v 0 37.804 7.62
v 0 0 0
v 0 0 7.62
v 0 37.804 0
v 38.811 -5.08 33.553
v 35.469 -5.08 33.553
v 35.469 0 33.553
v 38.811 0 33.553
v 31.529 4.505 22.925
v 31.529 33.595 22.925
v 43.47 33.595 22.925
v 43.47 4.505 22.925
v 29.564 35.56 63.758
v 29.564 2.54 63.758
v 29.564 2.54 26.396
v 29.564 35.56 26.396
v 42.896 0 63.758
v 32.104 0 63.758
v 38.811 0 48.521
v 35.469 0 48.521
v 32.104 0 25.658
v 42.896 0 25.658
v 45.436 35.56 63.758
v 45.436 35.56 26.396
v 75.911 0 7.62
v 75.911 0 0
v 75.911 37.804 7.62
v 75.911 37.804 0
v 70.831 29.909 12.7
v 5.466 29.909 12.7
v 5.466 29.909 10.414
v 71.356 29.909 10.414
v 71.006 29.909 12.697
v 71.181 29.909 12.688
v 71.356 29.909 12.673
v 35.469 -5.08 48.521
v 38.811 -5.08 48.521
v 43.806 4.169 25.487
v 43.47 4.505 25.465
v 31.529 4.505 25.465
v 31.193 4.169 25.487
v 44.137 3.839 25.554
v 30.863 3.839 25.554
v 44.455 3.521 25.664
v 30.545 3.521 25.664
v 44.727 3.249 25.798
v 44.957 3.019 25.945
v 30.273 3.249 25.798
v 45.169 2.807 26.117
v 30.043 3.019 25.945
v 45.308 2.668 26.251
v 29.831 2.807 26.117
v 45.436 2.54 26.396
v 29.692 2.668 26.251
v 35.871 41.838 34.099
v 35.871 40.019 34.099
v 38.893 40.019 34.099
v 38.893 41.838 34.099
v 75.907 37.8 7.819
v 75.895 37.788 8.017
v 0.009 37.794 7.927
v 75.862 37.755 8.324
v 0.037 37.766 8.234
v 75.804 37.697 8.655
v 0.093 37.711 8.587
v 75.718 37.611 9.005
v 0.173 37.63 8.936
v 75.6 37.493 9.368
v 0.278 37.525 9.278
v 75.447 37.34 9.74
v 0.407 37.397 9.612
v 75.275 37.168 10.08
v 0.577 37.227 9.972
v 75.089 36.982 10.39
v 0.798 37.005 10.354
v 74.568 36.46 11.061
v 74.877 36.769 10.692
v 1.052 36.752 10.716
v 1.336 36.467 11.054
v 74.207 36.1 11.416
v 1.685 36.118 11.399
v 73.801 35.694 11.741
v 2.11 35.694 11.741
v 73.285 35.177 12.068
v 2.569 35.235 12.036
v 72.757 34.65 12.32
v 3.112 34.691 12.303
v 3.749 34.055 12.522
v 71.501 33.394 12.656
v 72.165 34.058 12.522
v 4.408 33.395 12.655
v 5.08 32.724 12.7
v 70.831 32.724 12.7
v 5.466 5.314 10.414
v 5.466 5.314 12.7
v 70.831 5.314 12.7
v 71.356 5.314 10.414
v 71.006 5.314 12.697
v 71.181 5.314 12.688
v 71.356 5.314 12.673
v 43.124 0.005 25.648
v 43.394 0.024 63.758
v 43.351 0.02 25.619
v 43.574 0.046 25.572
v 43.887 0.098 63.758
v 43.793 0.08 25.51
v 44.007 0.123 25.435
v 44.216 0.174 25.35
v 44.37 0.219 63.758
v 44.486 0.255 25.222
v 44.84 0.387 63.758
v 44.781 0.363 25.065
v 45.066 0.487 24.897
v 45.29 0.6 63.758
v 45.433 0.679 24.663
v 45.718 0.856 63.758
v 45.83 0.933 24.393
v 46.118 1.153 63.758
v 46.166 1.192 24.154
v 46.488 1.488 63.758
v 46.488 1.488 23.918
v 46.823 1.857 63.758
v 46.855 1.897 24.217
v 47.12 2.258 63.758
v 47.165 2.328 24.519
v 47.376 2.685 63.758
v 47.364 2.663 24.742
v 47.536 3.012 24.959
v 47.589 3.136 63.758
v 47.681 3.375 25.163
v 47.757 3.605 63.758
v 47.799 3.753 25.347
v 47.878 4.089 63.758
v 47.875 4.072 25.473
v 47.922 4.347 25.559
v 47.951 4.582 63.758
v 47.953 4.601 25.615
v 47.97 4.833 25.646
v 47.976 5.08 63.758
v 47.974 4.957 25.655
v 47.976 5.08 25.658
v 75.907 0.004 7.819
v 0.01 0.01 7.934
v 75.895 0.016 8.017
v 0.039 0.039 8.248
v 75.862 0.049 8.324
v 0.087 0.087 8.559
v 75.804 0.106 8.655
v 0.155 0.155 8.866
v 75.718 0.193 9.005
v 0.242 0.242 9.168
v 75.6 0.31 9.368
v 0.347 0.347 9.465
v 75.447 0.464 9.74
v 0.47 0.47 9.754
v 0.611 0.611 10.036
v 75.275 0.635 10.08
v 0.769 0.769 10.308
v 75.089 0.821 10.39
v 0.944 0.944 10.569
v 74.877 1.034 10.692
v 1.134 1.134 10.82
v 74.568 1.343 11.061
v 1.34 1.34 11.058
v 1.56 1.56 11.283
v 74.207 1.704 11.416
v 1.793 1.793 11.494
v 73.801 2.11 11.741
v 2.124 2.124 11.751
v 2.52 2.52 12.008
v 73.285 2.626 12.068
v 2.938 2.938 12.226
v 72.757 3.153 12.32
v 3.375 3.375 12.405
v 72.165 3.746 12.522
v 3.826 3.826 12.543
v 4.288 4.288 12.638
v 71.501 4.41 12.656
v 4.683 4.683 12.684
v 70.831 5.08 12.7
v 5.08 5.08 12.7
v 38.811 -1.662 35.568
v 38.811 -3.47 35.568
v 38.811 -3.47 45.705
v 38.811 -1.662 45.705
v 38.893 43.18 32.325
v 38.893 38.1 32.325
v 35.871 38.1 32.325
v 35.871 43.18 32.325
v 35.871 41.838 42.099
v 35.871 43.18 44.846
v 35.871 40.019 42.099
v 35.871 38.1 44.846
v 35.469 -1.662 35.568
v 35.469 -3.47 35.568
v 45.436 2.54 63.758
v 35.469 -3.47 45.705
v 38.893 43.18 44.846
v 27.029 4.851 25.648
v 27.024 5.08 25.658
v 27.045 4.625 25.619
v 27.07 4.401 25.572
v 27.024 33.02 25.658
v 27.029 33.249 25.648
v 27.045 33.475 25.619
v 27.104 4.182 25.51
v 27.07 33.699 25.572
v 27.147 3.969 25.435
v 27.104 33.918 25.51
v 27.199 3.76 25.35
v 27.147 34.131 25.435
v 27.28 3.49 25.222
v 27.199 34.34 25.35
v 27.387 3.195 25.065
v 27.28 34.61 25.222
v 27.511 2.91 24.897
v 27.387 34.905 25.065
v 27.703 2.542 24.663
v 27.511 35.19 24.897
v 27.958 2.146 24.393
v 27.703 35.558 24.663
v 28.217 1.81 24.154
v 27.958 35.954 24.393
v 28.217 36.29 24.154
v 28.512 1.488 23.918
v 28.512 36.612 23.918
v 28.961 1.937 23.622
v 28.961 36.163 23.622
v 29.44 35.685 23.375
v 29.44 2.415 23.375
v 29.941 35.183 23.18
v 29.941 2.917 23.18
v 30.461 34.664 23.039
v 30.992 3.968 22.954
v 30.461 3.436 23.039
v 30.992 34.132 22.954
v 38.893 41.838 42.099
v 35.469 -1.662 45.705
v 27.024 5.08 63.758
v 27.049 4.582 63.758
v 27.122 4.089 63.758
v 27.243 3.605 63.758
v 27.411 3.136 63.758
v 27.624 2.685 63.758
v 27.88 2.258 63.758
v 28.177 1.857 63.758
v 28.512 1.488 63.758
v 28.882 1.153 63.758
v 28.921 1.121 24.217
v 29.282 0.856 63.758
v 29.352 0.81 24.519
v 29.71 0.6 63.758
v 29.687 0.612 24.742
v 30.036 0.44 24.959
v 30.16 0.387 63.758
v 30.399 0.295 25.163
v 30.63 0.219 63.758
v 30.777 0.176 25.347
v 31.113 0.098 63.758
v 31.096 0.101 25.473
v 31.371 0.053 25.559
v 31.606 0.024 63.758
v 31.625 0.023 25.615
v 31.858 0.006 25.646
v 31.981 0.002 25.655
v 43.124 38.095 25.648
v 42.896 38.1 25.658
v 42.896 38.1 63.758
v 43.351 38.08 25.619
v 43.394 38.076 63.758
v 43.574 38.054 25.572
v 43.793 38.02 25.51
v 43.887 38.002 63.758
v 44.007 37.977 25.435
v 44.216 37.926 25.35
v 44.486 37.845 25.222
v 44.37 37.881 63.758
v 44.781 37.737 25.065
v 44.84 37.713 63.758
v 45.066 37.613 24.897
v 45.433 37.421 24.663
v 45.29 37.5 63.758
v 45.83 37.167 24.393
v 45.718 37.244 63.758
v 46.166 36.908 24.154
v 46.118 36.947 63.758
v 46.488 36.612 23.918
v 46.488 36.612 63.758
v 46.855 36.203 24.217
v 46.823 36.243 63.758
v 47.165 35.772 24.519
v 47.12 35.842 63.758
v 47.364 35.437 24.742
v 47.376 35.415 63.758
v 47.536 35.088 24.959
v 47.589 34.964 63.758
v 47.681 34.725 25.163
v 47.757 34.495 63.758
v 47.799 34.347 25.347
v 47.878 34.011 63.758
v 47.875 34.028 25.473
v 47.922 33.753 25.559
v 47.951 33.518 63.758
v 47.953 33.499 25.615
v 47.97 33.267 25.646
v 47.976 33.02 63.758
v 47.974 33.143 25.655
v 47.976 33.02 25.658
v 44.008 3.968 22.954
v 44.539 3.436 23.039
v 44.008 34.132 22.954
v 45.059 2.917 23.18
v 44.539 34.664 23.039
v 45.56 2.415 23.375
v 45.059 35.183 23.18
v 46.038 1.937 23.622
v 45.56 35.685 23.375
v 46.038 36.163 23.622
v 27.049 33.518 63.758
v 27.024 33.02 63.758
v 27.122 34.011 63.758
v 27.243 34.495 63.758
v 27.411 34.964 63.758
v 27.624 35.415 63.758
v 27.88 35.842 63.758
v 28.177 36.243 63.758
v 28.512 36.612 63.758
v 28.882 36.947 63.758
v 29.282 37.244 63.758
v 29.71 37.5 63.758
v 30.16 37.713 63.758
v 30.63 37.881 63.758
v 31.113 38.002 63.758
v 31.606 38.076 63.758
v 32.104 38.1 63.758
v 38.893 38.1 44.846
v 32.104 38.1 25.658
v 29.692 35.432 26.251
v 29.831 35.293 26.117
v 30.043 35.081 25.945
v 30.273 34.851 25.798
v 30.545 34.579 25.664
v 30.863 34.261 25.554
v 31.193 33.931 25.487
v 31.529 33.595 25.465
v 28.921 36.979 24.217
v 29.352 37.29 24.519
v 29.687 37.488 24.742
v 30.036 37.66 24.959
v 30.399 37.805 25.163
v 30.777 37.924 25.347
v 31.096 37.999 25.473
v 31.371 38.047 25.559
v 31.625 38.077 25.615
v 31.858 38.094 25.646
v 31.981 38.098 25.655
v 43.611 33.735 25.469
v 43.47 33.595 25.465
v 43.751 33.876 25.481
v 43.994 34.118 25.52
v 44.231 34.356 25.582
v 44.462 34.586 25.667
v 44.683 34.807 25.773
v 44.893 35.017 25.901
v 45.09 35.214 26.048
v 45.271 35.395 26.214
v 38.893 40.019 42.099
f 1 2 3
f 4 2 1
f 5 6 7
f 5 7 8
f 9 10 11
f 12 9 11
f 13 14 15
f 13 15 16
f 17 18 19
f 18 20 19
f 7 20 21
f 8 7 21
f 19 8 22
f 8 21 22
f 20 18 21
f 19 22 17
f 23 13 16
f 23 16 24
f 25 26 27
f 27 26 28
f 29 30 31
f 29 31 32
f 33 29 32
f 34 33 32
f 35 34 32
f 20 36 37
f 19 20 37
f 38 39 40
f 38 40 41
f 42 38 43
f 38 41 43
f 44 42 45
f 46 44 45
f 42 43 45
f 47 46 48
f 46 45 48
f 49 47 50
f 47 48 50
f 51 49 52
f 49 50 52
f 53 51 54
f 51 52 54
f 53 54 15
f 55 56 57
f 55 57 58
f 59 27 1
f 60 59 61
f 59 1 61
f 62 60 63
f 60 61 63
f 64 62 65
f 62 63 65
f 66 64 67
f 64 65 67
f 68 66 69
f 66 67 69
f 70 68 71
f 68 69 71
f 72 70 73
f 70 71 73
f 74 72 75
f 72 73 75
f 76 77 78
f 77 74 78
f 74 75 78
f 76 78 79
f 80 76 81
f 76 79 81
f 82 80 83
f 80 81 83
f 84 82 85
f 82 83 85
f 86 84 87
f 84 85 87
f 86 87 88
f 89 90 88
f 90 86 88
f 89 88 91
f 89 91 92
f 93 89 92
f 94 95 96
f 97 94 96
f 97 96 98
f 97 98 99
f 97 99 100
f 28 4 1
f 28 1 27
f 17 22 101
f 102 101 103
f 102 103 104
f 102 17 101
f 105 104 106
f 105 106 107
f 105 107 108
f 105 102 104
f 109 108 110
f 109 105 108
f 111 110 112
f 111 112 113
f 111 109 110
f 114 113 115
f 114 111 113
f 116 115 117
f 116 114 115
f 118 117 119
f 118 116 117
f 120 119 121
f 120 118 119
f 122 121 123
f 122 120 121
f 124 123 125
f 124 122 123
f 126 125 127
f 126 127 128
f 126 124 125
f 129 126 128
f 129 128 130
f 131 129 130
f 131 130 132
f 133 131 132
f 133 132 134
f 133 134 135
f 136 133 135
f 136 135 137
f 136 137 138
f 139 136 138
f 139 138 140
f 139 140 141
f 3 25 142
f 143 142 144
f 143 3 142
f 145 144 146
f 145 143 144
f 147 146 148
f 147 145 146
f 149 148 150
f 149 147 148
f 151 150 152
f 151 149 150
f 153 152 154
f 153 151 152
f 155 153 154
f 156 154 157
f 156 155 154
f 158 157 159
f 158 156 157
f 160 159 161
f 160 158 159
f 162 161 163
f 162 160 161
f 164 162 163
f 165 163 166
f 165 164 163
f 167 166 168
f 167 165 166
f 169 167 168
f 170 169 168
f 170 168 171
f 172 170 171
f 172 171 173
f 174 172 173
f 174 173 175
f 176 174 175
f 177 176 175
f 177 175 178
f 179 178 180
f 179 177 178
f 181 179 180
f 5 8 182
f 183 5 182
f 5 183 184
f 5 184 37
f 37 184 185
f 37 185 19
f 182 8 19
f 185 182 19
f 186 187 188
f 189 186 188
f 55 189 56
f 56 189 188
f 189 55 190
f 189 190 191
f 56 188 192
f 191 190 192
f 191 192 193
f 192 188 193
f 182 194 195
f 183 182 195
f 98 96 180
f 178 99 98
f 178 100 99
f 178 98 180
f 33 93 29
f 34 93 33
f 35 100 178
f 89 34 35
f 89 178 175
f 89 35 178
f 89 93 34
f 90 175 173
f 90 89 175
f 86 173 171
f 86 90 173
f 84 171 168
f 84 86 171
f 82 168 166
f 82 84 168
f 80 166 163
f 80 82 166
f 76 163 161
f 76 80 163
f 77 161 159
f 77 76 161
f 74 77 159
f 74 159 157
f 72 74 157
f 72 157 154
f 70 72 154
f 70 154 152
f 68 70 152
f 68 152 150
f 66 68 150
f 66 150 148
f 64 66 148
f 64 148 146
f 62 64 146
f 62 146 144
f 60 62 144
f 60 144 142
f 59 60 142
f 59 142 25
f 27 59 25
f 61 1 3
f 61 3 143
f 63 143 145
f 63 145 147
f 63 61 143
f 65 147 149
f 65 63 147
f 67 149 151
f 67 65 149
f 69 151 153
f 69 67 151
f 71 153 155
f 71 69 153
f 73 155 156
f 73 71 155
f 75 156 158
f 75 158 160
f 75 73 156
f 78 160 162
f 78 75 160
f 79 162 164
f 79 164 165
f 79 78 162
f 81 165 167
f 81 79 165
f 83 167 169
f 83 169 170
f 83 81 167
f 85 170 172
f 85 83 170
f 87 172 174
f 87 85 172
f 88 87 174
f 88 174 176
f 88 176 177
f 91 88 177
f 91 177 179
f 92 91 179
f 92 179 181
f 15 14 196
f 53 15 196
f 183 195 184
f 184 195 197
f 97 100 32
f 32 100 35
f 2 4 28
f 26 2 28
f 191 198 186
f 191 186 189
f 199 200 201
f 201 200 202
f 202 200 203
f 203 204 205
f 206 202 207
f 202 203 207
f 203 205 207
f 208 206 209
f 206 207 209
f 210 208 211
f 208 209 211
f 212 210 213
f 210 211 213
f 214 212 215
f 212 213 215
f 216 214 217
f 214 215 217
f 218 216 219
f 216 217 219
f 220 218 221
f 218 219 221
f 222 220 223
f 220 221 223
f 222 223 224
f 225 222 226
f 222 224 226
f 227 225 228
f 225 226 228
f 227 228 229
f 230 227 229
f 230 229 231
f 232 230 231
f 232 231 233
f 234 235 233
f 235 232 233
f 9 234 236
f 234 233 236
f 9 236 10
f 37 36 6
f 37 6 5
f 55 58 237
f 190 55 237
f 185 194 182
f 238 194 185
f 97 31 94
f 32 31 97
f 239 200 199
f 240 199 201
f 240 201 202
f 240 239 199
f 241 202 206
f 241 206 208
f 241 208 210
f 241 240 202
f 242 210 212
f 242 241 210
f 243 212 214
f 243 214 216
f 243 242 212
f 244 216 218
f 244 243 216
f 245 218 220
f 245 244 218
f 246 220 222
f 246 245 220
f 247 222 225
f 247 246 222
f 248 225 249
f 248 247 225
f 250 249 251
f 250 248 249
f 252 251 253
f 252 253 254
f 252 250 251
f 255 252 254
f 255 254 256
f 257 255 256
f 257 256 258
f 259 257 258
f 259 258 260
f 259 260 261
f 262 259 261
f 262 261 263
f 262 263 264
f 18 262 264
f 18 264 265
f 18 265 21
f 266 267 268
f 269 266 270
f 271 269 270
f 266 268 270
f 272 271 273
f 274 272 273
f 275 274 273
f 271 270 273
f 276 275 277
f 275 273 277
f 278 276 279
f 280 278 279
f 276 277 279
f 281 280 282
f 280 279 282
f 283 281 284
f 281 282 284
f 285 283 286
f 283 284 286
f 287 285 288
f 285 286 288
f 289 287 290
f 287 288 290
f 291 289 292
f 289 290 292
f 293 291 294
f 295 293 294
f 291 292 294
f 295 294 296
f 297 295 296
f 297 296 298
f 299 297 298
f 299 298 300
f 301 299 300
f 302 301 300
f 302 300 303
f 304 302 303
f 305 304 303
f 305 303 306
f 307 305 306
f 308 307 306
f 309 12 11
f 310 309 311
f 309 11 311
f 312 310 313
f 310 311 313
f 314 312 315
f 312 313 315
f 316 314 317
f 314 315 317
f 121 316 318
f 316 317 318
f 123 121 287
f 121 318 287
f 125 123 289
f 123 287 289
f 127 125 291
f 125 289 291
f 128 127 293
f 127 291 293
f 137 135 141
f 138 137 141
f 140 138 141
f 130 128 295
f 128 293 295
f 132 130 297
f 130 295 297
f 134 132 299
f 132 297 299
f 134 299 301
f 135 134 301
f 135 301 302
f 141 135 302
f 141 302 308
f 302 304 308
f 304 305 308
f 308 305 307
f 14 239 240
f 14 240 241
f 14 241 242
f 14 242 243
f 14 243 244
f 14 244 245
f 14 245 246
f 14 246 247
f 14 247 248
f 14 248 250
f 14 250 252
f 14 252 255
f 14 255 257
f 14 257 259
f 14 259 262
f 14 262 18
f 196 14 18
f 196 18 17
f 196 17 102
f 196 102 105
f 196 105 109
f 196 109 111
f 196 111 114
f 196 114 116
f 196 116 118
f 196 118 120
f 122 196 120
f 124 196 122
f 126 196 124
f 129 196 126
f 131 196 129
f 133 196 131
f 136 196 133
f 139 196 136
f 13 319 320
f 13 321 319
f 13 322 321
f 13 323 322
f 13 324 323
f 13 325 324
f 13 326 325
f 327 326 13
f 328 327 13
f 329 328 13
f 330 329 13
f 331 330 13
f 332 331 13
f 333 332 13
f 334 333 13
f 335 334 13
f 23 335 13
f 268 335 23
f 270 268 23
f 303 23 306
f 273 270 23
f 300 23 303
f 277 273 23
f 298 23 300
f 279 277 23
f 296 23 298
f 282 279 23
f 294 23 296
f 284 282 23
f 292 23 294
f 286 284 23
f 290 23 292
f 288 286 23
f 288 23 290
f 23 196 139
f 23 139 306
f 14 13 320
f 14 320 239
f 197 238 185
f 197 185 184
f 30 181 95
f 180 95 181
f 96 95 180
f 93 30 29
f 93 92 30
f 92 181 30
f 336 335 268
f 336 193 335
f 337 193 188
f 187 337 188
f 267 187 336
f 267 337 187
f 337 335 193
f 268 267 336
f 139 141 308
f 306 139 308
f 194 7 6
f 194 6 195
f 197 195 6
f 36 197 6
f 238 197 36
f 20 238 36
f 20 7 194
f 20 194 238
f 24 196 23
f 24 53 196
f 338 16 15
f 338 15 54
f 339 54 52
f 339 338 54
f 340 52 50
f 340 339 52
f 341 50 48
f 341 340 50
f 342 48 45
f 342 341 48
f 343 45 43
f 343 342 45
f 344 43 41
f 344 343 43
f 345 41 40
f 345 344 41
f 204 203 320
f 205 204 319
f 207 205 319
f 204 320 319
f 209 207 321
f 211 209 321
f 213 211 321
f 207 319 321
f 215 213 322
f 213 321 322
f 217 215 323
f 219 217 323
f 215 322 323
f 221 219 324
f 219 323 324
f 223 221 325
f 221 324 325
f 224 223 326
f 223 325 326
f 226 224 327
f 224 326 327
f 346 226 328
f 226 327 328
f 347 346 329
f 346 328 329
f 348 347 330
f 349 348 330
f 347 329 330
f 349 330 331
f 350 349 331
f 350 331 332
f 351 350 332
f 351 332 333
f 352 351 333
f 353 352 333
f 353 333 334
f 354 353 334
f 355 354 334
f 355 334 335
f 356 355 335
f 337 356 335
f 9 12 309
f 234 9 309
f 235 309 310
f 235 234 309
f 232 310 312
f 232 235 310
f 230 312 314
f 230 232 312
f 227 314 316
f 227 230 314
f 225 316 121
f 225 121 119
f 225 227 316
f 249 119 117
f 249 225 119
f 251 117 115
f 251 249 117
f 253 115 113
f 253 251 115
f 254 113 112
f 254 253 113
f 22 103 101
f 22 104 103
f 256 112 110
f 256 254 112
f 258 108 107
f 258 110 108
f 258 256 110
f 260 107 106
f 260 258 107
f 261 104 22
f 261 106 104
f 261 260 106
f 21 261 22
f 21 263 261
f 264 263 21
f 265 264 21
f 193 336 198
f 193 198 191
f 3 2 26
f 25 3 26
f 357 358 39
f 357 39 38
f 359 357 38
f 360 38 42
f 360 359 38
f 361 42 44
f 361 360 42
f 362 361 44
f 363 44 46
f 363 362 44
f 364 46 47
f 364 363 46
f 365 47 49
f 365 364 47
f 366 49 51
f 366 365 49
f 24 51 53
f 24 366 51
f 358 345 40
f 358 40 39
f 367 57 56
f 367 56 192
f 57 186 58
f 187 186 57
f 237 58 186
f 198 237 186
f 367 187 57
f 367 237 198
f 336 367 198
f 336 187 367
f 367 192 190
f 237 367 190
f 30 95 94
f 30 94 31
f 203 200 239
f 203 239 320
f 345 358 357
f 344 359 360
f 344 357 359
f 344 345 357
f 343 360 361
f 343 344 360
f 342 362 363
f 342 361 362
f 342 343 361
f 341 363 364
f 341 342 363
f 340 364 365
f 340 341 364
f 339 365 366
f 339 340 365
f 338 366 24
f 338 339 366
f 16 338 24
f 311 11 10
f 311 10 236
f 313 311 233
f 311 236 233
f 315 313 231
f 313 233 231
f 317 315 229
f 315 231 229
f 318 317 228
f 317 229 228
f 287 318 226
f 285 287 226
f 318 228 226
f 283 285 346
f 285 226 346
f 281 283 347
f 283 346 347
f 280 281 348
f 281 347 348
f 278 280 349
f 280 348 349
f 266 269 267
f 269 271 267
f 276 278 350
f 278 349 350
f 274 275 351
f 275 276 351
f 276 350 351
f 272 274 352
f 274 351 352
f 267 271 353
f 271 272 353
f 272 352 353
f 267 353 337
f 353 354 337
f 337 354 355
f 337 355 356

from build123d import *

# Parameters (mm, degrees)
F0_W         = 75.910821557
F0_H         = 37.8035865724
F1_DEPTH     = 12.7
F2_W         = 65.8906013705
F2_H         = 24.5951046236
F3_DEPTH     = 2.286
F7_T1_DEPTH  = 101.310821557
F7_T3_DEPTH  = 63.2035865724
F8_W         = 20.9513884038
F8_H         = 2.7327910066
F9_DEPTH     = 38.1
F10_T1_DEPTH = 43.477489898
F10_T3_DEPTH = 60.6261014942
F11_W        = 20.9513884038
F11_H        = 38.1
F12_DEPTH    = 38.1
F13_T        = -2.54
F14_R        = 5.08
F15_R        = 5.08
F16_W        = 3.3429935575
F16_H        = 14.9679705501
F17_DEPTH    = 5.08
F18_W        = 1.8081573071
F18_H        = 10.1374536753
F19_DEPTH    = 5.08
F20_W        = 3.0222646892
F20_H        = 12.5214233994
F21_DEPTH    = 5.08
F22_W        = 1.8191151321
F22_H        = 8.0005712807
F23_DEPTH    = 5.08


# Not quite as in the source:
# - a fillet or chamfer that OpenCascade refuses, or shapes differently, is made with other operations: its cross-section is extruded or revolved along the edge and cut away or added
# - the program builds the solid bodies; features that only make, move or delete a surface that nothing else refers to are left out


with BuildPart() as f1:
    # F0 (on Top) → F1 (new body)
    with BuildSketch(Plane.XY):
        with Locations((37.9554107785, 18.9017932862)):
            Rectangle(F0_W, F0_H)
    extrude(amount=F1_DEPTH)

    # F2 (on face) → F3 (cut)
    with BuildSketch(Plane.XY.offset(12.7)):
        with Locations((38.4108766448, 17.6113096531)):
            Rectangle(F2_W, F2_H)
    extrude(amount=-F3_DEPTH, mode=Mode.SUBTRACT)

    # F7: fillet of radius 5.08 on 4 edges, made by hand

    # F7_s2 → F7_t1 (cut)
    with BuildSketch(Plane.YZ.offset(-12.7)):
        with BuildLine():
            ThreePointArc((0, 7.62), (1.4878975516, 11.2121024484), (5.08, 12.7))
            Line((5.08, 12.7), (0, 12.7))
            Line((0, 12.7), (0, 7.62))
        make_face()
        with BuildLine():
            ThreePointArc((37.8035865724, 7.62), (36.3156890208, 11.2121024484), (32.7235865724, 12.7))
            Line((32.7235865724, 12.7), (37.8035865724, 12.7))
            Line((37.8035865724, 12.7), (37.8035865724, 7.62))
        make_face()
    extrude(amount=F7_T1_DEPTH, mode=Mode.SUBTRACT)

    # F7_s4 → F7_t3 (cut)
    with BuildSketch(Plane.XZ.offset(-50.5035865724)):
        with BuildLine():
            ThreePointArc((0, 7.62), (1.4878975516, 11.2121024484), (5.08, 12.7))
            Line((5.08, 12.7), (0, 12.7))
            Line((0, 12.7), (0, 7.62))
        make_face()
        with BuildLine():
            ThreePointArc((70.830821557, 12.7), (74.4229240055, 11.2121024484), (75.910821557, 7.62))
            Line((75.910821557, 7.62), (75.910821557, 12.7))
            Line((75.910821557, 12.7), (70.830821557, 12.7))
        make_face()
    extrude(amount=F7_T3_DEPTH, mode=Mode.SUBTRACT)


with BuildPart() as f9:
    # F8 (on Front) → F9 (new body)
    with BuildSketch(Plane.XZ):
        with Locations((37.4999428168, 24.2914613336)):
            Rectangle(F8_W, F8_H)
    extrude(amount=-F9_DEPTH)

    # F10: fillet of radius 5.08 on 4 edges, made by hand

    # F10_s2 → F10_t1 (cut)
    with BuildSketch(Plane.YZ.offset(15.7611978678)):
        with BuildLine():
            ThreePointArc((4.5052202988, 22.9250658303), (1.8705876572, 23.6616672943), (0, 25.6578568369))
            Line((0, 25.6578568369), (0, 22.9250658303))
            Line((0, 22.9250658303), (4.5052202988, 22.9250658303))
        make_face()
        with BuildLine():
            ThreePointArc((33.5947797012, 22.9250658303), (36.2294123428, 23.6616672943), (38.1, 25.6578568369))
            Line((38.1, 25.6578568369), (38.1, 22.9250658303))
            Line((38.1, 22.9250658303), (33.5947797012, 22.9250658303))
        make_face()
    extrude(amount=F10_T1_DEPTH, mode=Mode.SUBTRACT)

    # F10_s4 → F10_t3 (cut)
    with BuildSketch(Plane.XZ.offset(-49.3630507471)):
        with BuildLine():
            ThreePointArc((43.4704167198, 22.9250658303), (46.1050493615, 23.6616672943), (47.9756370187, 25.6578568369))
            Line((47.9756370187, 25.6578568369), (47.9756370187, 22.9250658303))
            Line((47.9756370187, 22.9250658303), (43.4704167198, 22.9250658303))
        make_face()
        with BuildLine():
            ThreePointArc((27.0242486149, 25.6578568369), (28.8948362721, 23.6616672943), (31.5294689138, 22.9250658303))
            Line((31.5294689138, 22.9250658303), (27.0242486149, 22.9250658303))
            Line((27.0242486149, 22.9250658303), (27.0242486149, 25.6578568369))
        make_face()
    extrude(amount=F10_T3_DEPTH, mode=Mode.SUBTRACT)

    # F11 (on face) → F12 (join)
    with BuildSketch(Plane.XY.offset(25.6578568369)):
        with Locations((37.4999428168, 19.05)):
            Rectangle(F11_W, F11_H)
    extrude(amount=F12_DEPTH)

    # F13
    f13_openings = [f9.faces().sort_by_distance(p)[0] for p in [
        (37.499943, 19.05, 63.757857),
    ]]
    offset(amount=F13_T, openings=f13_openings)

    # F14
    f14_edges = [f9.edges().sort_by_distance(p)[0] for p in [
        (47.975637, 38.1, 44.707857),
        (47.975637, 0, 44.707857),
        (27.024249, 38.1, 44.707857),
    ]]
    fillet(f14_edges, radius=F14_R)

    # F15
    f15_edges = [f9.edges().sort_by_distance(p)[0] for p in [
        (27.024249, 0, 44.707857),
    ]]
    fillet(f15_edges, radius=F15_R)

    # F16 (on face) → F17 (join)
    with BuildSketch(Plane.XZ):
        with Locations((37.1399968863, 41.0371609032)):
            Rectangle(F16_W, F16_H)
    extrude(amount=F17_DEPTH)

    # F18 (on face) → F19 (cut)
    with BuildSketch(Plane(origin=(35.4685001075, 0, 0), x_dir=(0, -1, 0), z_dir=(-1, 0, 0))):
        with Locations((2.5656485814, 40.6363867223)):
            Rectangle(F18_W, F18_H)
    extrude(amount=-F19_DEPTH, mode=Mode.SUBTRACT)

    # F20 (on face) → F21 (join)
    with BuildSketch(Plane(origin=(0, 38.1, 0), x_dir=(-1, 0, 0), z_dir=(0, 1, 0))):
        with Locations((-37.3821165413, 38.5855287313)):
            Rectangle(F20_W, F20_H)
    extrude(amount=F21_DEPTH)

    # F22 (on face) → F23 (cut)
    with BuildSketch(Plane.YZ.offset(38.8932488859)):
        with Locations((40.9287344664, 38.0991082639)):
            Rectangle(F22_W, F22_H)
    extrude(amount=-F23_DEPTH, mode=Mode.SUBTRACT)


solid = Compound([f1.part, f9.part])
